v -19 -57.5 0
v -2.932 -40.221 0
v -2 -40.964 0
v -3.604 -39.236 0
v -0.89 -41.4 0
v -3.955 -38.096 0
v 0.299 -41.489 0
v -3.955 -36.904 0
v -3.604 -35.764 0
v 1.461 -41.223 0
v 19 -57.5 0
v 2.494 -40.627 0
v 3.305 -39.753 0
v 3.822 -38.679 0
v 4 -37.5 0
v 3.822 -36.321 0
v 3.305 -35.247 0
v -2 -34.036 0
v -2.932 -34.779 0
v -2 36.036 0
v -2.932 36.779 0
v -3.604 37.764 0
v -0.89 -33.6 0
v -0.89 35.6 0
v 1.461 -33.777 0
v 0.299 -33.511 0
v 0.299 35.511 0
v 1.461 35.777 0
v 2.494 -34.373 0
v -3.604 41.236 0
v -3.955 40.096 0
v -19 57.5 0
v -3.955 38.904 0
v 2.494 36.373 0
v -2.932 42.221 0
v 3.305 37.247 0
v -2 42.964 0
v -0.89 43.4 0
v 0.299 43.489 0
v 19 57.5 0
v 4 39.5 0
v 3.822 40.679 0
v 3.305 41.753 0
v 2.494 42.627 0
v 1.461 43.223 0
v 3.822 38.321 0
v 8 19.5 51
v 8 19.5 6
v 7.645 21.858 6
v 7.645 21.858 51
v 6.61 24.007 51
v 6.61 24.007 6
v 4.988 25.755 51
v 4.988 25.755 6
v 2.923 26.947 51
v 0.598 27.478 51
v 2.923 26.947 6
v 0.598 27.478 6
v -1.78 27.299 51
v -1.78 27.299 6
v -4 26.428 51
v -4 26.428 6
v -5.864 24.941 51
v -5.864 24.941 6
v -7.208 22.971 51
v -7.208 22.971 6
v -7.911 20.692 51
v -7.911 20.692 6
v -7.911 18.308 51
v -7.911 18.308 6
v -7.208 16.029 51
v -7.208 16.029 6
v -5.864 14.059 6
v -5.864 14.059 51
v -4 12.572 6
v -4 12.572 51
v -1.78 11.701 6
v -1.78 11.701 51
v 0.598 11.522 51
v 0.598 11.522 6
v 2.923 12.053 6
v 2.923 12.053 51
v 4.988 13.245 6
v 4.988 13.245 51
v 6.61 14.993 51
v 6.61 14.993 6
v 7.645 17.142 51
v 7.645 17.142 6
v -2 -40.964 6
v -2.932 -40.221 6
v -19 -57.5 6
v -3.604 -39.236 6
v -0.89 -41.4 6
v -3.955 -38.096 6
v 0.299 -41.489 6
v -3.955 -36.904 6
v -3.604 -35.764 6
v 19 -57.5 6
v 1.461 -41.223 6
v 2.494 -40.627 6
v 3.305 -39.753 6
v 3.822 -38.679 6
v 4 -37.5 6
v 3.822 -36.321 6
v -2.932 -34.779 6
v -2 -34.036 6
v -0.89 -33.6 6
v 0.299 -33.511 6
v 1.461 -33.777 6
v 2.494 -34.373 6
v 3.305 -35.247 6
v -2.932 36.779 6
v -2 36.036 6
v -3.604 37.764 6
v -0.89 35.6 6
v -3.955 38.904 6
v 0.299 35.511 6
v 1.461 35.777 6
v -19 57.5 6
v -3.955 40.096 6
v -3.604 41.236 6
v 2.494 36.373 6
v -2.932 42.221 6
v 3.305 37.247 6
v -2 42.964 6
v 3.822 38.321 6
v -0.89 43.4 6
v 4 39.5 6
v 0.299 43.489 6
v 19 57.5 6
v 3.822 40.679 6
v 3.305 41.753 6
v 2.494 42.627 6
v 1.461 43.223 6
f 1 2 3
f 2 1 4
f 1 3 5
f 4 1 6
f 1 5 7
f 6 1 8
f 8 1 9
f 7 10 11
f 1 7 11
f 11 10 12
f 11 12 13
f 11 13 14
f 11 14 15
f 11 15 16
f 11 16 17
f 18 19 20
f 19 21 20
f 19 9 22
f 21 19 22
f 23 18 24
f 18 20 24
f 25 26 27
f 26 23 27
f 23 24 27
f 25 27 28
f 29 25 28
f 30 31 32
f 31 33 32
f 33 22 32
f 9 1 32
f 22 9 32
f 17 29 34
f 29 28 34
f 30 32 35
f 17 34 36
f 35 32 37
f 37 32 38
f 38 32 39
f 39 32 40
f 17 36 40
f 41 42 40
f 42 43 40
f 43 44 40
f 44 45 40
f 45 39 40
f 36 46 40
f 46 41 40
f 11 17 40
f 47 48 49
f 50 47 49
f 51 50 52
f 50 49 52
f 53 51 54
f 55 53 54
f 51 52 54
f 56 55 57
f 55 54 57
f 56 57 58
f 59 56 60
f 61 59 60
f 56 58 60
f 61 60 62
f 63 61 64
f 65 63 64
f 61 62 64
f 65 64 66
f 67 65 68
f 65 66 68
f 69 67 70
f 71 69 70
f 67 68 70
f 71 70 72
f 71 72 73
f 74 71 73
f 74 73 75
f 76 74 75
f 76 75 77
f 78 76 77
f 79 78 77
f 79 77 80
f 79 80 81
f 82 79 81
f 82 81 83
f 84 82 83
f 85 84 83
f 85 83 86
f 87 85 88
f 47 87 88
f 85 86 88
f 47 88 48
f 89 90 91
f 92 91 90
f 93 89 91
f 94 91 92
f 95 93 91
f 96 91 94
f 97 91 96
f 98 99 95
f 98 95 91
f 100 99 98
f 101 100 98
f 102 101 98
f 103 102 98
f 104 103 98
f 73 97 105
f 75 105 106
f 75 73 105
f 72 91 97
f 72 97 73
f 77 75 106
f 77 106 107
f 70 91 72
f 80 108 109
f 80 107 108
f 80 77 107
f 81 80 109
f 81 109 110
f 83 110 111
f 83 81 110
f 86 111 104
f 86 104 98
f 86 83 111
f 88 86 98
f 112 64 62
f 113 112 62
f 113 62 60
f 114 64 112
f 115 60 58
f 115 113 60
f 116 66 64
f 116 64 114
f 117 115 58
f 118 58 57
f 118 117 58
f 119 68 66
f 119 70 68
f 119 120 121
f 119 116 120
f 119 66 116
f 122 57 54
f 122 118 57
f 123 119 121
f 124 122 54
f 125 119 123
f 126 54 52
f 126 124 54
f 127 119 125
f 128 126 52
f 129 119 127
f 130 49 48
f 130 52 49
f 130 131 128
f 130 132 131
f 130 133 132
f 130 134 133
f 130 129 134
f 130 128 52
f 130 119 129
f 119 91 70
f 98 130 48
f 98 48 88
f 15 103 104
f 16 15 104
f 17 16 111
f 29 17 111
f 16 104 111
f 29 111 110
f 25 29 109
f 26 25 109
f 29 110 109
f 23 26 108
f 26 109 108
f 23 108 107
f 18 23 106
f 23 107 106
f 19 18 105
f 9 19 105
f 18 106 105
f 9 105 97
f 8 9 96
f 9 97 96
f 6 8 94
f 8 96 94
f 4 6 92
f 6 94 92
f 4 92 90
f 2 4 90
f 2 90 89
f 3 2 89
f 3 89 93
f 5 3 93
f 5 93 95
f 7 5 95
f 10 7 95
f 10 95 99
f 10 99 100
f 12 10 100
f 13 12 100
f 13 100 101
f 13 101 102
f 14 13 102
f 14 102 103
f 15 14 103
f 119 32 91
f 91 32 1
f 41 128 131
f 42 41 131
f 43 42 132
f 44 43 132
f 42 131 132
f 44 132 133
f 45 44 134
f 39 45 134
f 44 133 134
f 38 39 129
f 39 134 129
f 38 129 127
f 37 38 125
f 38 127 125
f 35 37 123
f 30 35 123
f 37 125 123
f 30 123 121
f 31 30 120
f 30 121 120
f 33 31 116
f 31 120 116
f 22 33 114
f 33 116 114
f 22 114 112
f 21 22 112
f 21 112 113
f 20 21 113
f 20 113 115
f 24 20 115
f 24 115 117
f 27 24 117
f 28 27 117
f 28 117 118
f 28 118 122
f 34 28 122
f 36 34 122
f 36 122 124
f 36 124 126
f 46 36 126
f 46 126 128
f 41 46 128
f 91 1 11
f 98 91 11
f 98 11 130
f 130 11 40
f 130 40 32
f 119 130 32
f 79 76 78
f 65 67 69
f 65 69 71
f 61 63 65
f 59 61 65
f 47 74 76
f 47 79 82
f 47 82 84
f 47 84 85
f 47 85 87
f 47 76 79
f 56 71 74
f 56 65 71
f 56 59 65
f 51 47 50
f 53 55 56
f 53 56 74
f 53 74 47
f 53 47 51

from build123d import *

# Parameters (mm, degrees)
F1_DEPTH = 6
F2_R     = 8
F5_DEPTH = 45
F3_R     = 4
F6_DEPTH = 6.001
F4_R     = 4
F7_DEPTH = 6.001


with BuildPart() as f1:
    # F0 (on Top) → F1 (new body)
    with BuildSketch(Plane.XY):
        Polygon((19, 57.5), (0, 57.5), (-19, 57.5), (-19, 0), (-19, -57.5), (0, -57.5), (19, -57.5), (19, 0), align=None)
    extrude(amount=F1_DEPTH)

    # F2 (on face) → F5 (join)
    with BuildSketch(Plane.XY.offset(6)):
        with Locations((0, 19.5)):
            Circle(F2_R)
    extrude(amount=F5_DEPTH)

    # F3 (on face) → F6 (cut, through all)
    with BuildSketch(Plane.XY.offset(6)):
        with Locations((0, 39.5)):
            Circle(F3_R)
    extrude(amount=-F6_DEPTH, mode=Mode.SUBTRACT)

    # F4 (on face) → F7 (cut, through all)
    with BuildSketch(Plane.XY.offset(6)):
        with Locations((0, -37.5)):
            Circle(F4_R)
    extrude(amount=-F7_DEPTH, mode=Mode.SUBTRACT)


solid = f1.part
